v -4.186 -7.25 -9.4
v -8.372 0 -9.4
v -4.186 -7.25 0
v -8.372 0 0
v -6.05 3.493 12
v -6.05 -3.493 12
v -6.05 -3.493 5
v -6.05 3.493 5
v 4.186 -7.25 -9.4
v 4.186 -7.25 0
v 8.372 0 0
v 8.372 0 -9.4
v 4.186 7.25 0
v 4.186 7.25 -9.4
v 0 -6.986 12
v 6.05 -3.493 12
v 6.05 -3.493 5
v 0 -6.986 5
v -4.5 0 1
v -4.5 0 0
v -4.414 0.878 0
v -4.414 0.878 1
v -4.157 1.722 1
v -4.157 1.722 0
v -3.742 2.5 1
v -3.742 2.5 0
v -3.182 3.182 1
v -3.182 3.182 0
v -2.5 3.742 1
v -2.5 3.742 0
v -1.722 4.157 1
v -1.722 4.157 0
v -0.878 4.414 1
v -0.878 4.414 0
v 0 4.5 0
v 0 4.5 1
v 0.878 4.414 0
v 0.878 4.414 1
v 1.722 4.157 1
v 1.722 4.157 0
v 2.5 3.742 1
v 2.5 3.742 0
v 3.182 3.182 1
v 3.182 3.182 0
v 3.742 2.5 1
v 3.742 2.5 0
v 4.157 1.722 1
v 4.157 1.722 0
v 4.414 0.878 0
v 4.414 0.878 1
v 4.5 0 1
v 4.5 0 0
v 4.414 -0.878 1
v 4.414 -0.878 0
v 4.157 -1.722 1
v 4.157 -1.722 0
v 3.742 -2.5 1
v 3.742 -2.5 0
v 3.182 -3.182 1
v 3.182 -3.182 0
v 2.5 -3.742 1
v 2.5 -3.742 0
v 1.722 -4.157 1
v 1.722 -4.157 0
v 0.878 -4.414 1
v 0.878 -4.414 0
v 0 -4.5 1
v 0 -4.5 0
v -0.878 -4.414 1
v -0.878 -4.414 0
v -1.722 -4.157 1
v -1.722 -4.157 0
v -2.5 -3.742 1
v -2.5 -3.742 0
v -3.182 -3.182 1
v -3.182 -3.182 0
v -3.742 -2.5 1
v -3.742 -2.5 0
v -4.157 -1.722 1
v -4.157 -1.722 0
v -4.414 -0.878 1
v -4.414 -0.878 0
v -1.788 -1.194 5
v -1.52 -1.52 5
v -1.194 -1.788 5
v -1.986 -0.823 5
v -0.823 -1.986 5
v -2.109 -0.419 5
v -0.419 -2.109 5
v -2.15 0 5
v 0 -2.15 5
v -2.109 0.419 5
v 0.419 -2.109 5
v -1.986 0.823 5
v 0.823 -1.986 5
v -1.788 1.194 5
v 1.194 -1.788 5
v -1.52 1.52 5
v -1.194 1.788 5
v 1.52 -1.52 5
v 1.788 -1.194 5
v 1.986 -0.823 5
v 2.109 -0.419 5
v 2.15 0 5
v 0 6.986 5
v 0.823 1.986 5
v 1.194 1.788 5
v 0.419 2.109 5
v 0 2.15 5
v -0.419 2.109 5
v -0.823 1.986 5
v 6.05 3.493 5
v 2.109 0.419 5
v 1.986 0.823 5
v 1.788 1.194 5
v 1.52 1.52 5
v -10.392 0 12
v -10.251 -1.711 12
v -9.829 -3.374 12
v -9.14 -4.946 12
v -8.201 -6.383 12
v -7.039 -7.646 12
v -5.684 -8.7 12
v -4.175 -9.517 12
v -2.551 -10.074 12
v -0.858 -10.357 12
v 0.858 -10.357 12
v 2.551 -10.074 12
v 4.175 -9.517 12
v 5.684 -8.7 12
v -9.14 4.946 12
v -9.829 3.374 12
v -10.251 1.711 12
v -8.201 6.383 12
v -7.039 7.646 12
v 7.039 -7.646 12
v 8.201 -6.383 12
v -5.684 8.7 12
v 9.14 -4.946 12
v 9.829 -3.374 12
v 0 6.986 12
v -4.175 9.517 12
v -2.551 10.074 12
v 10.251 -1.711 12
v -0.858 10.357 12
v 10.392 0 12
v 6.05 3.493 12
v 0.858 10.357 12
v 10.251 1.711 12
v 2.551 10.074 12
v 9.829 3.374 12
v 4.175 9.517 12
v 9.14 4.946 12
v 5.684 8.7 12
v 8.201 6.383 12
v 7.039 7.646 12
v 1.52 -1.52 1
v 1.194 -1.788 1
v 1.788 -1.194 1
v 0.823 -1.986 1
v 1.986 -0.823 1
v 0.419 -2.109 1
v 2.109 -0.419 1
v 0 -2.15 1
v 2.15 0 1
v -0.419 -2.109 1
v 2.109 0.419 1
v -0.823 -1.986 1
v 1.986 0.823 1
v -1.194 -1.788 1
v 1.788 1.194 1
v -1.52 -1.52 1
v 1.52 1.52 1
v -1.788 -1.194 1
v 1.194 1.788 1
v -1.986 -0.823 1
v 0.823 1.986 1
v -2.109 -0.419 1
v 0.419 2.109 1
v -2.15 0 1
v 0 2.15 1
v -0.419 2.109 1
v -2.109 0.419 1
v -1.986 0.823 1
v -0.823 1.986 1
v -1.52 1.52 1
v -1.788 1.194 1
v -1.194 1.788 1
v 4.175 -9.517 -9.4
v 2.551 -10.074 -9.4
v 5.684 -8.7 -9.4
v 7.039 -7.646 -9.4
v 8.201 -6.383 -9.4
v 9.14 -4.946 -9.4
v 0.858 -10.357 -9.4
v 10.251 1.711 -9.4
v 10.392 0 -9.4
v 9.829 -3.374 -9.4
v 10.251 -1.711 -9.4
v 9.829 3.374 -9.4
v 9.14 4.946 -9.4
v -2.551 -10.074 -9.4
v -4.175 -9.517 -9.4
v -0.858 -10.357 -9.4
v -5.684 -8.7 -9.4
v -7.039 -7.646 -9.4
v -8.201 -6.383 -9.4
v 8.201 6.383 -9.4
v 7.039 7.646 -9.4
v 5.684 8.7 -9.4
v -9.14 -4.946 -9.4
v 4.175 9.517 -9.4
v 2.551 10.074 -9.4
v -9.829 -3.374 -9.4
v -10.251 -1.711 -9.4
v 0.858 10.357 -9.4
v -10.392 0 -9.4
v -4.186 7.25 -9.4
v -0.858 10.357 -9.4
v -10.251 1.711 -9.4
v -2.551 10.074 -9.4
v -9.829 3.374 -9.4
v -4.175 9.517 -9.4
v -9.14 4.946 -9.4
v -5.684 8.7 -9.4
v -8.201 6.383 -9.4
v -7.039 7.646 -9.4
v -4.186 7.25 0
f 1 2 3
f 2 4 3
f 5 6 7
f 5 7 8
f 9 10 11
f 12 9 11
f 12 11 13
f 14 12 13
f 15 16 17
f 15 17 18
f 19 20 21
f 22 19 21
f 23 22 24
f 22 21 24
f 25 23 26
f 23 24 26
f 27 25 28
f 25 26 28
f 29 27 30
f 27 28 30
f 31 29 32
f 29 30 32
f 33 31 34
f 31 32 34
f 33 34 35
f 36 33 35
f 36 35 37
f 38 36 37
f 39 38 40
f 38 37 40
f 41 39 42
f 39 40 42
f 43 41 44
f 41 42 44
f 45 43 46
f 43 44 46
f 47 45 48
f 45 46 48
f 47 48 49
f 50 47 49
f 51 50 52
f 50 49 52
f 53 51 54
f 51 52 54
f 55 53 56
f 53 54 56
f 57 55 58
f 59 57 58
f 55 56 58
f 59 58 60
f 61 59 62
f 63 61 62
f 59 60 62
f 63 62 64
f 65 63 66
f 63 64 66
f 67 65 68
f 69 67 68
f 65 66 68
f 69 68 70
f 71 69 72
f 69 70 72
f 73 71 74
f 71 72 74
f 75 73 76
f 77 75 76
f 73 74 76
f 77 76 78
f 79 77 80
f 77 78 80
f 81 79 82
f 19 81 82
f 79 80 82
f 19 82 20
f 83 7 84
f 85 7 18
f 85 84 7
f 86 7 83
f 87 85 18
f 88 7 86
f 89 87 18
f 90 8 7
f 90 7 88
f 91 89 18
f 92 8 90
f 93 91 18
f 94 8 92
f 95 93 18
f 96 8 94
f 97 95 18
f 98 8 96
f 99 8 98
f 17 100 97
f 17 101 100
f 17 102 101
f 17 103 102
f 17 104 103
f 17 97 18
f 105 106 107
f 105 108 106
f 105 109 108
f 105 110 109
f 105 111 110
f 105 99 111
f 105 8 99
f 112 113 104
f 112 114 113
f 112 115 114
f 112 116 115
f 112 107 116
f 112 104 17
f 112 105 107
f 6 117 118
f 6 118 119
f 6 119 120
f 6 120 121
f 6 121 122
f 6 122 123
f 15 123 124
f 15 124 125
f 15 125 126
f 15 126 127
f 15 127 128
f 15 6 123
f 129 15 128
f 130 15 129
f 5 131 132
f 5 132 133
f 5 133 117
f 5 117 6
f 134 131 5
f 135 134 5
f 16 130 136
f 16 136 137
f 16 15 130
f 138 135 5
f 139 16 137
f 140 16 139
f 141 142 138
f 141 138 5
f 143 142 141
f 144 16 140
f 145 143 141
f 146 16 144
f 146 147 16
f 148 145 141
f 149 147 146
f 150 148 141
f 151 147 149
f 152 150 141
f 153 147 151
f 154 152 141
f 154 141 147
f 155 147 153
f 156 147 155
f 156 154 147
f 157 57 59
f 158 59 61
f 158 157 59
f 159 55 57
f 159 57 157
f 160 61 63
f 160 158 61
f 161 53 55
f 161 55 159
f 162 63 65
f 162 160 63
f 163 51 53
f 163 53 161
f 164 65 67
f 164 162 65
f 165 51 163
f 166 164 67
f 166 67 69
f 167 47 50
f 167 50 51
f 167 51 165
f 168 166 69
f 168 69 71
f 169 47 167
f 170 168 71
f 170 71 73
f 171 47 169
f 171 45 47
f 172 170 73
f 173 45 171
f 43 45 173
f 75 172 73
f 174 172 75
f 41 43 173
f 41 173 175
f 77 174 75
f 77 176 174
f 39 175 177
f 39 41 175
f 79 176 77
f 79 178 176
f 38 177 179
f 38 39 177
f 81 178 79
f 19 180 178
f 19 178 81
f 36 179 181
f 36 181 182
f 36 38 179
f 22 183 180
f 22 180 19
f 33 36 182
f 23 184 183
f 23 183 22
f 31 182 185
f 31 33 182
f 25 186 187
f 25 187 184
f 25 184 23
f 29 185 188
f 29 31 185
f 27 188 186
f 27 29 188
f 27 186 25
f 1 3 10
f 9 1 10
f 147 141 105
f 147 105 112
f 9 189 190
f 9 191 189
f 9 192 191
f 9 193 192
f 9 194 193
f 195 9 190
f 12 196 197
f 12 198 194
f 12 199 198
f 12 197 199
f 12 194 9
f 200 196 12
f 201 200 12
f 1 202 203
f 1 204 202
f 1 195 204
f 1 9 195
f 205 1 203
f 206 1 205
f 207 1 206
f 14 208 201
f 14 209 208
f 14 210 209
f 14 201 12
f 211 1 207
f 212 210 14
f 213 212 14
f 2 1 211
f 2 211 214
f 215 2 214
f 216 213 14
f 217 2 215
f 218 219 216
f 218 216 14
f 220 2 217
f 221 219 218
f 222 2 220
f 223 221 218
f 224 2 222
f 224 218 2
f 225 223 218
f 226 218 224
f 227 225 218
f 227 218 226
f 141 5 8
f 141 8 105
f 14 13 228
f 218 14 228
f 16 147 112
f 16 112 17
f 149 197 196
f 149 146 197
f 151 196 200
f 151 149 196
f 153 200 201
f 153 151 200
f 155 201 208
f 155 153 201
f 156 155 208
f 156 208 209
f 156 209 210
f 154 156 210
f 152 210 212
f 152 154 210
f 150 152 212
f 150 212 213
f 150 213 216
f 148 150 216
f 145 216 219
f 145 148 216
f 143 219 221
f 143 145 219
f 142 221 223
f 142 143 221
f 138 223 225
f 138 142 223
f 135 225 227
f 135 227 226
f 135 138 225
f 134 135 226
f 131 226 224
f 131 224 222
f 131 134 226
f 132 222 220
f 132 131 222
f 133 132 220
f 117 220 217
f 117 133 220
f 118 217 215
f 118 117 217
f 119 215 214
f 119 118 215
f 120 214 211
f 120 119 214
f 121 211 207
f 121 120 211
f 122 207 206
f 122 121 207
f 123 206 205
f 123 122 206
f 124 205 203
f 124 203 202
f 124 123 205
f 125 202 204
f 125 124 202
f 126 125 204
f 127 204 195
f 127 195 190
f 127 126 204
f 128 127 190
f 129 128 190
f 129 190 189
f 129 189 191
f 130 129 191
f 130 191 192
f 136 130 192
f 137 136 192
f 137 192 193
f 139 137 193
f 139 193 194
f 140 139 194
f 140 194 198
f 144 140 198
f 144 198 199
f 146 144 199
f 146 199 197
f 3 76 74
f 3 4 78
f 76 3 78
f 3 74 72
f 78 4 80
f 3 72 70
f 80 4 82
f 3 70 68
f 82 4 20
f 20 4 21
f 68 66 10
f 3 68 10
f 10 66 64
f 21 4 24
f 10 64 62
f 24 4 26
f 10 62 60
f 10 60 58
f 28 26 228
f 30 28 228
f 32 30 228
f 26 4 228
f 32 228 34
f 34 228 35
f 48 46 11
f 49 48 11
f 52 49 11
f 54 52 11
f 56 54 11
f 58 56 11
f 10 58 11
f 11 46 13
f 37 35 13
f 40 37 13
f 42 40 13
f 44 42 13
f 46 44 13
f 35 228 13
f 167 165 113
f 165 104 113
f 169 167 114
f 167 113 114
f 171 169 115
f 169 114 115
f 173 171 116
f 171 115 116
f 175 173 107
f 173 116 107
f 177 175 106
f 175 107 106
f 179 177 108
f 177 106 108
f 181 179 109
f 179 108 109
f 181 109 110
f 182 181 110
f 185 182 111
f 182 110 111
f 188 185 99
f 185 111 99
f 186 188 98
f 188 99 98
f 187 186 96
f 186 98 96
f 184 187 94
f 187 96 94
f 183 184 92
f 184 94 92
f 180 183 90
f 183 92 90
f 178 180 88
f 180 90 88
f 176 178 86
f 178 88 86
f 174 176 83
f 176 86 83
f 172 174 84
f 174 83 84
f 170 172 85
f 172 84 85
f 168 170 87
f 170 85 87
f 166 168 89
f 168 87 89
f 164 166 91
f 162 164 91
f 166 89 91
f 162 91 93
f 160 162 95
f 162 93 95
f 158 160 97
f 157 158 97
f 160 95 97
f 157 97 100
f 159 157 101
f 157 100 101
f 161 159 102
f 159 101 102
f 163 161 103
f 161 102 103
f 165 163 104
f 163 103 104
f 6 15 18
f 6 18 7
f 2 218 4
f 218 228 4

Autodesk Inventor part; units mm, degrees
sketch "Sketch2" plane through (0, 0, 0) normal (0, 0, 1) x (1, 0, 0)
  circle A0 centre (0, 0) radius 10.3923
  line L0 (-4.0415, -7) -> (4.0415, -7) projected
  line L1 (4.0415, -7) -> (8.0829, 0) projected
  line L2 (8.0829, 0) -> (4.0415, 7) projected
  line L3 (4.0415, 7) -> (-4.0415, 7) projected
  line L4 (-4.0415, 7) -> (-8.0829, 0) projected
  line L5 (-8.0829, 0) -> (-4.0415, -7) projected
  line L6 (4.0415, 7) -> (5.1962, 9) construction
  line L7 (-8.3716, 0) -> (-4.1858, -7.25)
  line L8 (-4.1858, -7.25) -> (4.1858, -7.25)
  line L9 (4.1858, -7.25) -> (8.3716, 0)
  line L10 (8.3716, 0) -> (4.1858, 7.25)
  line L11 (4.1858, 7.25) -> (-4.1858, 7.25)
  line L12 (-4.1858, 7.25) -> (-8.3716, 0)
  dimension "d9" = 2
  dimension "d10" = 0.25
  dimension "d11" = 0.25
  dimension "d12" = 0.25
  dimension "d13" = 0.25
  dimension "d14" = 0.25
  dimension "d15" = 0.25
ref_plane "Work Plane1" through (-12.7, 0, -12.7) normal (0, 0, 1) x (1, 0, 0)
ref_plane "Work Plane2" through (-11.7, 1, -12.7) normal (0, 0, 1) x (1, 0, 0)
ref_plane "Work Plane3" through (-8.125, -8.125, -9.7) normal (0, 0, 1) x (1, 0, 0)
extrude "Extrusion3" add sketch "Sketch2" against normal up to surface (9.7 mm away) contours A0
sketch "Sketch4" plane through (0, 0, 0) normal (0, 0, 1) x (1, 0, 0)
  circle A0 centre (0, 0) radius 10.3923 projected
extrude "Extrusion4" add sketch "Sketch4" along normal blind 12
sketch "Sketch5" plane through (0, 0, -9.7) normal (0, 0, -1) x (-1, 0, 0)
  circle A0 centre (0, 0) radius 10.3923 projected
  point P0 (0, 0)
extrude "Extrusion5" cut sketch "Sketch5" against normal blind 0.3
sketch "Sketch6" plane through (0, 0, 12) normal (0, 0, 1) x (1, 0, 0)
  line L0 (-6.05, 3.493) -> (0, 6.9859)
  line L1 (0, 6.9859) -> (6.05, 3.493)
  line L2 (6.05, 3.493) -> (6.05, -3.493)
  line L3 (6.05, -3.493) -> (0, -6.9859)
  line L4 (0, -6.9859) -> (-6.05, -3.493)
  line L5 (-6.05, -3.493) -> (-6.05, 3.493)
  line L6 (-14.5492, 0) -> (14.5492, 0) projected
  line L7 (0, -6.9859) -> (0, 6.9859) construction
  line L8 (6.05, -3.493) -> (-6.05, 3.493) construction
  line L9 (0, -14.5492) -> (0, 14.5492) projected
  point P0 (0, 0)
  point P1 (14.5492, 0)
  point P2 (0, 0)
  dimension "d32" = 0
  dimension "d35" = 12.1
extrude "Extrusion6" cut sketch "Sketch6" against normal blind 7
sketch "Sketch7" plane through (0, 0, 5) normal (0, 0, 1) x (1, 0, 0)
  circle A0 centre (0, 0) radius 2.15
  point P0 (0, 0)
  dimension "d21" = 4.3
extrude "Extrusion7" cut sketch "Sketch7" against normal through all
sketch "Sketch10" plane through (0, 0, 0) normal (0, 0, -1) x (-1, 0, 0)
  circle A0 centre (0, 0) radius 10.3923 projected
  circle A1 centre (0, 0) radius 4.5
  dimension "d25" = 9
extrude "Extrusion8" cut sketch "Sketch10" against normal blind 1 contours A1
equation "\"d11\" = d10"
equation "\"d12\" = d11"
equation "\"d13\" = d12"
equation "\"d14\" = d13"
equation "\"d15\" = d14"
properties part number "ServoToScrewKey" material "ABS Plastic"
